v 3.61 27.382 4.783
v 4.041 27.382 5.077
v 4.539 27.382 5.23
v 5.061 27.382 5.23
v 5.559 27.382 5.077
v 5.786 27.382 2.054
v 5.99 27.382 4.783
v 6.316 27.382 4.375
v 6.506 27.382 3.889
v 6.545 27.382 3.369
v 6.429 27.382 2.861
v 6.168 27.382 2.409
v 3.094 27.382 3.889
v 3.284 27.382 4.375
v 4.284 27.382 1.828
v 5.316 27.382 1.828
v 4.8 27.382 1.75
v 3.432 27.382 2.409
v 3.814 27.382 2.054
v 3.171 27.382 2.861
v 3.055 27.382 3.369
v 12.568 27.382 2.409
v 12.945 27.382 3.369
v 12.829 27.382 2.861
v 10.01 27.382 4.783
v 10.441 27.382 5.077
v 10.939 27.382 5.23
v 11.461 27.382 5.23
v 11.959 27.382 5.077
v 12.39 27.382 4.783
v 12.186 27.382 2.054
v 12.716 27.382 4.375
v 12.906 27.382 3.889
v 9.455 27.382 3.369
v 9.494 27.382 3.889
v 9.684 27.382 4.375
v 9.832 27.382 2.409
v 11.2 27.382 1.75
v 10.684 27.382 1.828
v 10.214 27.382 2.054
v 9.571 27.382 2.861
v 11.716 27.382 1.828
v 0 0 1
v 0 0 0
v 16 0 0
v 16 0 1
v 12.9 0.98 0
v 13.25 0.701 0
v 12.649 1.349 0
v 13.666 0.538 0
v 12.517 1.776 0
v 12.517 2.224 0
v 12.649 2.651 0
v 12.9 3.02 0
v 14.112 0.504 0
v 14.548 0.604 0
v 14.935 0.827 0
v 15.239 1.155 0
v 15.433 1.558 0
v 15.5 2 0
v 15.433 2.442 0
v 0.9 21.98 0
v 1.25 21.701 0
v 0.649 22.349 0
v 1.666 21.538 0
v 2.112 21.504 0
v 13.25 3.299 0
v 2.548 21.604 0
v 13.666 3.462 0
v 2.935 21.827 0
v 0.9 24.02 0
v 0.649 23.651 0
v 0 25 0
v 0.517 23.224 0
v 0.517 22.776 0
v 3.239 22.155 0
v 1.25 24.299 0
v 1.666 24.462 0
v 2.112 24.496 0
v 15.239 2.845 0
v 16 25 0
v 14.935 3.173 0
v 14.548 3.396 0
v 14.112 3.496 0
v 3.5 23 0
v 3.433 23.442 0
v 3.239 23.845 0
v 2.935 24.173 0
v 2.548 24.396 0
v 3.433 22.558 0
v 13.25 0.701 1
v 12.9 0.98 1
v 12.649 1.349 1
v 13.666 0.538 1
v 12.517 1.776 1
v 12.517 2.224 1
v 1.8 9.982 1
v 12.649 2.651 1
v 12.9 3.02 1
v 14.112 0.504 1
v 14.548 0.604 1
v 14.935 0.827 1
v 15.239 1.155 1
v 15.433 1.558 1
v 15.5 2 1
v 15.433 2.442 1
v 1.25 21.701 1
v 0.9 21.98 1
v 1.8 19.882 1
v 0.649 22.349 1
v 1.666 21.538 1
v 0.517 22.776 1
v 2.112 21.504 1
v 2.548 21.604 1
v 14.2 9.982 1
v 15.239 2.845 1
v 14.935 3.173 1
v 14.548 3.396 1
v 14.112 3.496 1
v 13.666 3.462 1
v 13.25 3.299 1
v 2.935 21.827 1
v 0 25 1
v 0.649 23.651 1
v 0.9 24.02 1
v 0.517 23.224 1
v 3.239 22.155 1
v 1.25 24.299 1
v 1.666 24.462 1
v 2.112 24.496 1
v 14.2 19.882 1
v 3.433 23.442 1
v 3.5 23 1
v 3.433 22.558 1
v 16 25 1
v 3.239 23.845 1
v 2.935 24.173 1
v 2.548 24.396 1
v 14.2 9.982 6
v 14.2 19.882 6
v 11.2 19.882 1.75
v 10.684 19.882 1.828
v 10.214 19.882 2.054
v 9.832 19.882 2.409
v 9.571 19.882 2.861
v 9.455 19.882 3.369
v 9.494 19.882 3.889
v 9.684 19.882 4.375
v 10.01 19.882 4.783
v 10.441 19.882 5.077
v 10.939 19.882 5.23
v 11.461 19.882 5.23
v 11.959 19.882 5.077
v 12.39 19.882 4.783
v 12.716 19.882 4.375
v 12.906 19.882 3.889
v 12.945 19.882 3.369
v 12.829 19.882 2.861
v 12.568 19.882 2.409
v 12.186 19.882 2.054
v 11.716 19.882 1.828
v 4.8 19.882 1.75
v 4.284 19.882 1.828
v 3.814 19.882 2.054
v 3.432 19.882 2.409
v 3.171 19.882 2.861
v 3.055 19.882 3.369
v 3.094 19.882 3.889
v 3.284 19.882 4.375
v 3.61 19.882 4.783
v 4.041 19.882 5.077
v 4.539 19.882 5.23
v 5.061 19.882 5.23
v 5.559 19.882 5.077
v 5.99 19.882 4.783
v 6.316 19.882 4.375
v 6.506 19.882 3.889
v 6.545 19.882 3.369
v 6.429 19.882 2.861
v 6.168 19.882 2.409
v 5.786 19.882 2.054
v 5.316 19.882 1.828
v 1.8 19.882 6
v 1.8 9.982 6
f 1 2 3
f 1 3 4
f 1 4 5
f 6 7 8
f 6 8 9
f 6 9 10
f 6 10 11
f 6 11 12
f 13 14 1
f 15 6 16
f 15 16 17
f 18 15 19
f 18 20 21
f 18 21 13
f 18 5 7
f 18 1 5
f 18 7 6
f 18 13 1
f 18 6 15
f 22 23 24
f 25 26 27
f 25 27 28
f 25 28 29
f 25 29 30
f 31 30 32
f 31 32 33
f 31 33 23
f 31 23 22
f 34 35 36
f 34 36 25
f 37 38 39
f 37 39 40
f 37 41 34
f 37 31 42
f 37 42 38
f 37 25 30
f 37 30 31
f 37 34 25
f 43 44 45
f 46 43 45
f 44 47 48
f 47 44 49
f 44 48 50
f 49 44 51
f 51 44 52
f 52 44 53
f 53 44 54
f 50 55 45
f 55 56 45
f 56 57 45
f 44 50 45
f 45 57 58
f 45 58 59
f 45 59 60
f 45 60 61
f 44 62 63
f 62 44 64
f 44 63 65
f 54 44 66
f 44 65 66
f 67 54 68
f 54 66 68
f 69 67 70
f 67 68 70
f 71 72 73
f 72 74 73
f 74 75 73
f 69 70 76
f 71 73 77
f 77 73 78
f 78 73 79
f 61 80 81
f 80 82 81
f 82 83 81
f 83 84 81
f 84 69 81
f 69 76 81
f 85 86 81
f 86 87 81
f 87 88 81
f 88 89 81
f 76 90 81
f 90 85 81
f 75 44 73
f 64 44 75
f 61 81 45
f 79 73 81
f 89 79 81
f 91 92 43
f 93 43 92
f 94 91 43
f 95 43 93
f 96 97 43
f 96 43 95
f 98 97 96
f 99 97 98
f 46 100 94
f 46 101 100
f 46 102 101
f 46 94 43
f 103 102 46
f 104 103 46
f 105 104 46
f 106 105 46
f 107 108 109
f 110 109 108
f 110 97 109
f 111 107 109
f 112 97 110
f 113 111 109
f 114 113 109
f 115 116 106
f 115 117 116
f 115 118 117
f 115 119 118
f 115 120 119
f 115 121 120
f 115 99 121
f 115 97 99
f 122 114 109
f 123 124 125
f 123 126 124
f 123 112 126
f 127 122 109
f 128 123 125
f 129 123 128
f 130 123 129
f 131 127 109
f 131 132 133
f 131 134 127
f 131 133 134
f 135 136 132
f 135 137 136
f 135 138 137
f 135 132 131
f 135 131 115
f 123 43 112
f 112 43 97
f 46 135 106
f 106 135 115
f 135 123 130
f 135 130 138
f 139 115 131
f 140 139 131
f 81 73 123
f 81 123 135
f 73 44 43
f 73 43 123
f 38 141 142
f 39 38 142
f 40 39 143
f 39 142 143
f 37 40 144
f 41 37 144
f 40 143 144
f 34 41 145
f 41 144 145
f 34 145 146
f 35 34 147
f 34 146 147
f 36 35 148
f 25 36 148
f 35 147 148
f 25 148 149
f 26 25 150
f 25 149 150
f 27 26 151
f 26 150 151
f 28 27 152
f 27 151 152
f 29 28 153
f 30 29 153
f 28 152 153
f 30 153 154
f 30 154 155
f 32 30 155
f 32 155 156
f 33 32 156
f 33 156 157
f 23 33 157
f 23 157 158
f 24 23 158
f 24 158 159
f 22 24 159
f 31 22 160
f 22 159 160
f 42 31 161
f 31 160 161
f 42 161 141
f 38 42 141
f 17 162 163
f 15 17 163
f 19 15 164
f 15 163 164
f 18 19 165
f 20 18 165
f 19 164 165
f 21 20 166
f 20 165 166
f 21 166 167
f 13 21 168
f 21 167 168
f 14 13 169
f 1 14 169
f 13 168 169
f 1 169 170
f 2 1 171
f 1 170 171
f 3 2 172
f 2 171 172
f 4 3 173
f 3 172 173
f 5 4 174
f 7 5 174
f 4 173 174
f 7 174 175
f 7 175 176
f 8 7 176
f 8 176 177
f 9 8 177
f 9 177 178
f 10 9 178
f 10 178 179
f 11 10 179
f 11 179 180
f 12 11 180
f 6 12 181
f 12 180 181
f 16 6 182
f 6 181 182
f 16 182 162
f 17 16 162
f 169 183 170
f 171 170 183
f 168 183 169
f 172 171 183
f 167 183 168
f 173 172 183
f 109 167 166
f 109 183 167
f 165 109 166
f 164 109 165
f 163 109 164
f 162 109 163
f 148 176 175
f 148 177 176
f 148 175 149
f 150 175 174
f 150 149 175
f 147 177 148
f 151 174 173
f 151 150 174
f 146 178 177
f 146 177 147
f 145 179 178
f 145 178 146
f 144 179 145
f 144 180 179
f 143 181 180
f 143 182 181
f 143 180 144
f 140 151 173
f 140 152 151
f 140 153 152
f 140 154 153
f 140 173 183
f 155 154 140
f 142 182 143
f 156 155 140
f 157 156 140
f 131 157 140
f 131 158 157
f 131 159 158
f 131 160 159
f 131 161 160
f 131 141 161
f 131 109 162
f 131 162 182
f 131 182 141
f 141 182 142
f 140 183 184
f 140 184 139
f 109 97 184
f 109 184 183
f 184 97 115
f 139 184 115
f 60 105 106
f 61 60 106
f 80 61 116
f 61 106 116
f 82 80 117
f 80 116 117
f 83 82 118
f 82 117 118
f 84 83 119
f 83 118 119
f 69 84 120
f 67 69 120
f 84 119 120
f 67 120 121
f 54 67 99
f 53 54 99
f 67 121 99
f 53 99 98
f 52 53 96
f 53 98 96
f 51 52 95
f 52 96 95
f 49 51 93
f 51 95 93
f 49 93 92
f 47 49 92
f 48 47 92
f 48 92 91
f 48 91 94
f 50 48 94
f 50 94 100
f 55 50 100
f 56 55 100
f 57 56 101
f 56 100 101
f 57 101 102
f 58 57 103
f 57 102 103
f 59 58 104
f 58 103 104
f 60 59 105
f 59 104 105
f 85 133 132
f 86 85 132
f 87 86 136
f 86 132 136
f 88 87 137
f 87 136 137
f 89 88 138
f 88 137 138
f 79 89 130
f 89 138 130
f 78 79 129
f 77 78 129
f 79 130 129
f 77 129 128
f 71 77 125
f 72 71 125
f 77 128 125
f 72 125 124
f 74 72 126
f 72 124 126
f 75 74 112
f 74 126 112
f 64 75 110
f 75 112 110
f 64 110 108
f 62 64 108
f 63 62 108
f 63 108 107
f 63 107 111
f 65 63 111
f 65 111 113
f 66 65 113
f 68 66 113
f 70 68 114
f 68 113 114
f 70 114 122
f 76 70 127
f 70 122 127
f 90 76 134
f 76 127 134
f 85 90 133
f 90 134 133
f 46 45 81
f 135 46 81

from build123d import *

# Parameters (mm, degrees)
SKETCH1_W           = 16
SKETCH1_H           = 25
BOSS_EXTRUDE1_DEPTH = 1
SKETCH2_R           = 1.5
CUT_EXTRUDE1_DEPTH  = 1
SKETCH3_W           = 12.4
SKETCH3_H           = 9.9
BOSS_EXTRUDE2_DEPTH = 5
SKETCH4_R           = 1.75
BOSS_EXTRUDE3_DEPTH = 7.5


with BuildPart() as part:
    # Sketch1 → Boss-Extrude1 (new body)
    with BuildSketch(Plane.XY):
        with Locations((8, 12.5)):
            Rectangle(SKETCH1_W, SKETCH1_H)
    extrude(amount=BOSS_EXTRUDE1_DEPTH)

    # Sketch2 → Cut-Extrude1 (cut)
    with BuildSketch(Plane.XY.offset(1)):
        with Locations((2, 23)):
            Circle(SKETCH2_R)
        with Locations((14, 2)):
            Circle(SKETCH2_R)
    extrude(amount=-CUT_EXTRUDE1_DEPTH, mode=Mode.SUBTRACT)

    # Sketch3 → Boss-Extrude2 (add)
    with BuildSketch(Plane.XY.offset(1)):
        with Locations((8, 14.931642479)):
            Rectangle(SKETCH3_W, SKETCH3_H)
    extrude(amount=BOSS_EXTRUDE2_DEPTH)

    # Sketch4 → Boss-Extrude3 (add)
    with BuildSketch(Plane(origin=(0, 19.881642479, 0), x_dir=(1, 0, 0), z_dir=(0, 1, 0))):
        with Locations(Location((4.8, -3.5, 0), (0, 0, 90))):
            Circle(SKETCH4_R)
        with Locations(Location((11.2, -3.5, 0), (0, 0, 90))):
            Circle(SKETCH4_R)
    extrude(amount=BOSS_EXTRUDE3_DEPTH)


solid = part.part
